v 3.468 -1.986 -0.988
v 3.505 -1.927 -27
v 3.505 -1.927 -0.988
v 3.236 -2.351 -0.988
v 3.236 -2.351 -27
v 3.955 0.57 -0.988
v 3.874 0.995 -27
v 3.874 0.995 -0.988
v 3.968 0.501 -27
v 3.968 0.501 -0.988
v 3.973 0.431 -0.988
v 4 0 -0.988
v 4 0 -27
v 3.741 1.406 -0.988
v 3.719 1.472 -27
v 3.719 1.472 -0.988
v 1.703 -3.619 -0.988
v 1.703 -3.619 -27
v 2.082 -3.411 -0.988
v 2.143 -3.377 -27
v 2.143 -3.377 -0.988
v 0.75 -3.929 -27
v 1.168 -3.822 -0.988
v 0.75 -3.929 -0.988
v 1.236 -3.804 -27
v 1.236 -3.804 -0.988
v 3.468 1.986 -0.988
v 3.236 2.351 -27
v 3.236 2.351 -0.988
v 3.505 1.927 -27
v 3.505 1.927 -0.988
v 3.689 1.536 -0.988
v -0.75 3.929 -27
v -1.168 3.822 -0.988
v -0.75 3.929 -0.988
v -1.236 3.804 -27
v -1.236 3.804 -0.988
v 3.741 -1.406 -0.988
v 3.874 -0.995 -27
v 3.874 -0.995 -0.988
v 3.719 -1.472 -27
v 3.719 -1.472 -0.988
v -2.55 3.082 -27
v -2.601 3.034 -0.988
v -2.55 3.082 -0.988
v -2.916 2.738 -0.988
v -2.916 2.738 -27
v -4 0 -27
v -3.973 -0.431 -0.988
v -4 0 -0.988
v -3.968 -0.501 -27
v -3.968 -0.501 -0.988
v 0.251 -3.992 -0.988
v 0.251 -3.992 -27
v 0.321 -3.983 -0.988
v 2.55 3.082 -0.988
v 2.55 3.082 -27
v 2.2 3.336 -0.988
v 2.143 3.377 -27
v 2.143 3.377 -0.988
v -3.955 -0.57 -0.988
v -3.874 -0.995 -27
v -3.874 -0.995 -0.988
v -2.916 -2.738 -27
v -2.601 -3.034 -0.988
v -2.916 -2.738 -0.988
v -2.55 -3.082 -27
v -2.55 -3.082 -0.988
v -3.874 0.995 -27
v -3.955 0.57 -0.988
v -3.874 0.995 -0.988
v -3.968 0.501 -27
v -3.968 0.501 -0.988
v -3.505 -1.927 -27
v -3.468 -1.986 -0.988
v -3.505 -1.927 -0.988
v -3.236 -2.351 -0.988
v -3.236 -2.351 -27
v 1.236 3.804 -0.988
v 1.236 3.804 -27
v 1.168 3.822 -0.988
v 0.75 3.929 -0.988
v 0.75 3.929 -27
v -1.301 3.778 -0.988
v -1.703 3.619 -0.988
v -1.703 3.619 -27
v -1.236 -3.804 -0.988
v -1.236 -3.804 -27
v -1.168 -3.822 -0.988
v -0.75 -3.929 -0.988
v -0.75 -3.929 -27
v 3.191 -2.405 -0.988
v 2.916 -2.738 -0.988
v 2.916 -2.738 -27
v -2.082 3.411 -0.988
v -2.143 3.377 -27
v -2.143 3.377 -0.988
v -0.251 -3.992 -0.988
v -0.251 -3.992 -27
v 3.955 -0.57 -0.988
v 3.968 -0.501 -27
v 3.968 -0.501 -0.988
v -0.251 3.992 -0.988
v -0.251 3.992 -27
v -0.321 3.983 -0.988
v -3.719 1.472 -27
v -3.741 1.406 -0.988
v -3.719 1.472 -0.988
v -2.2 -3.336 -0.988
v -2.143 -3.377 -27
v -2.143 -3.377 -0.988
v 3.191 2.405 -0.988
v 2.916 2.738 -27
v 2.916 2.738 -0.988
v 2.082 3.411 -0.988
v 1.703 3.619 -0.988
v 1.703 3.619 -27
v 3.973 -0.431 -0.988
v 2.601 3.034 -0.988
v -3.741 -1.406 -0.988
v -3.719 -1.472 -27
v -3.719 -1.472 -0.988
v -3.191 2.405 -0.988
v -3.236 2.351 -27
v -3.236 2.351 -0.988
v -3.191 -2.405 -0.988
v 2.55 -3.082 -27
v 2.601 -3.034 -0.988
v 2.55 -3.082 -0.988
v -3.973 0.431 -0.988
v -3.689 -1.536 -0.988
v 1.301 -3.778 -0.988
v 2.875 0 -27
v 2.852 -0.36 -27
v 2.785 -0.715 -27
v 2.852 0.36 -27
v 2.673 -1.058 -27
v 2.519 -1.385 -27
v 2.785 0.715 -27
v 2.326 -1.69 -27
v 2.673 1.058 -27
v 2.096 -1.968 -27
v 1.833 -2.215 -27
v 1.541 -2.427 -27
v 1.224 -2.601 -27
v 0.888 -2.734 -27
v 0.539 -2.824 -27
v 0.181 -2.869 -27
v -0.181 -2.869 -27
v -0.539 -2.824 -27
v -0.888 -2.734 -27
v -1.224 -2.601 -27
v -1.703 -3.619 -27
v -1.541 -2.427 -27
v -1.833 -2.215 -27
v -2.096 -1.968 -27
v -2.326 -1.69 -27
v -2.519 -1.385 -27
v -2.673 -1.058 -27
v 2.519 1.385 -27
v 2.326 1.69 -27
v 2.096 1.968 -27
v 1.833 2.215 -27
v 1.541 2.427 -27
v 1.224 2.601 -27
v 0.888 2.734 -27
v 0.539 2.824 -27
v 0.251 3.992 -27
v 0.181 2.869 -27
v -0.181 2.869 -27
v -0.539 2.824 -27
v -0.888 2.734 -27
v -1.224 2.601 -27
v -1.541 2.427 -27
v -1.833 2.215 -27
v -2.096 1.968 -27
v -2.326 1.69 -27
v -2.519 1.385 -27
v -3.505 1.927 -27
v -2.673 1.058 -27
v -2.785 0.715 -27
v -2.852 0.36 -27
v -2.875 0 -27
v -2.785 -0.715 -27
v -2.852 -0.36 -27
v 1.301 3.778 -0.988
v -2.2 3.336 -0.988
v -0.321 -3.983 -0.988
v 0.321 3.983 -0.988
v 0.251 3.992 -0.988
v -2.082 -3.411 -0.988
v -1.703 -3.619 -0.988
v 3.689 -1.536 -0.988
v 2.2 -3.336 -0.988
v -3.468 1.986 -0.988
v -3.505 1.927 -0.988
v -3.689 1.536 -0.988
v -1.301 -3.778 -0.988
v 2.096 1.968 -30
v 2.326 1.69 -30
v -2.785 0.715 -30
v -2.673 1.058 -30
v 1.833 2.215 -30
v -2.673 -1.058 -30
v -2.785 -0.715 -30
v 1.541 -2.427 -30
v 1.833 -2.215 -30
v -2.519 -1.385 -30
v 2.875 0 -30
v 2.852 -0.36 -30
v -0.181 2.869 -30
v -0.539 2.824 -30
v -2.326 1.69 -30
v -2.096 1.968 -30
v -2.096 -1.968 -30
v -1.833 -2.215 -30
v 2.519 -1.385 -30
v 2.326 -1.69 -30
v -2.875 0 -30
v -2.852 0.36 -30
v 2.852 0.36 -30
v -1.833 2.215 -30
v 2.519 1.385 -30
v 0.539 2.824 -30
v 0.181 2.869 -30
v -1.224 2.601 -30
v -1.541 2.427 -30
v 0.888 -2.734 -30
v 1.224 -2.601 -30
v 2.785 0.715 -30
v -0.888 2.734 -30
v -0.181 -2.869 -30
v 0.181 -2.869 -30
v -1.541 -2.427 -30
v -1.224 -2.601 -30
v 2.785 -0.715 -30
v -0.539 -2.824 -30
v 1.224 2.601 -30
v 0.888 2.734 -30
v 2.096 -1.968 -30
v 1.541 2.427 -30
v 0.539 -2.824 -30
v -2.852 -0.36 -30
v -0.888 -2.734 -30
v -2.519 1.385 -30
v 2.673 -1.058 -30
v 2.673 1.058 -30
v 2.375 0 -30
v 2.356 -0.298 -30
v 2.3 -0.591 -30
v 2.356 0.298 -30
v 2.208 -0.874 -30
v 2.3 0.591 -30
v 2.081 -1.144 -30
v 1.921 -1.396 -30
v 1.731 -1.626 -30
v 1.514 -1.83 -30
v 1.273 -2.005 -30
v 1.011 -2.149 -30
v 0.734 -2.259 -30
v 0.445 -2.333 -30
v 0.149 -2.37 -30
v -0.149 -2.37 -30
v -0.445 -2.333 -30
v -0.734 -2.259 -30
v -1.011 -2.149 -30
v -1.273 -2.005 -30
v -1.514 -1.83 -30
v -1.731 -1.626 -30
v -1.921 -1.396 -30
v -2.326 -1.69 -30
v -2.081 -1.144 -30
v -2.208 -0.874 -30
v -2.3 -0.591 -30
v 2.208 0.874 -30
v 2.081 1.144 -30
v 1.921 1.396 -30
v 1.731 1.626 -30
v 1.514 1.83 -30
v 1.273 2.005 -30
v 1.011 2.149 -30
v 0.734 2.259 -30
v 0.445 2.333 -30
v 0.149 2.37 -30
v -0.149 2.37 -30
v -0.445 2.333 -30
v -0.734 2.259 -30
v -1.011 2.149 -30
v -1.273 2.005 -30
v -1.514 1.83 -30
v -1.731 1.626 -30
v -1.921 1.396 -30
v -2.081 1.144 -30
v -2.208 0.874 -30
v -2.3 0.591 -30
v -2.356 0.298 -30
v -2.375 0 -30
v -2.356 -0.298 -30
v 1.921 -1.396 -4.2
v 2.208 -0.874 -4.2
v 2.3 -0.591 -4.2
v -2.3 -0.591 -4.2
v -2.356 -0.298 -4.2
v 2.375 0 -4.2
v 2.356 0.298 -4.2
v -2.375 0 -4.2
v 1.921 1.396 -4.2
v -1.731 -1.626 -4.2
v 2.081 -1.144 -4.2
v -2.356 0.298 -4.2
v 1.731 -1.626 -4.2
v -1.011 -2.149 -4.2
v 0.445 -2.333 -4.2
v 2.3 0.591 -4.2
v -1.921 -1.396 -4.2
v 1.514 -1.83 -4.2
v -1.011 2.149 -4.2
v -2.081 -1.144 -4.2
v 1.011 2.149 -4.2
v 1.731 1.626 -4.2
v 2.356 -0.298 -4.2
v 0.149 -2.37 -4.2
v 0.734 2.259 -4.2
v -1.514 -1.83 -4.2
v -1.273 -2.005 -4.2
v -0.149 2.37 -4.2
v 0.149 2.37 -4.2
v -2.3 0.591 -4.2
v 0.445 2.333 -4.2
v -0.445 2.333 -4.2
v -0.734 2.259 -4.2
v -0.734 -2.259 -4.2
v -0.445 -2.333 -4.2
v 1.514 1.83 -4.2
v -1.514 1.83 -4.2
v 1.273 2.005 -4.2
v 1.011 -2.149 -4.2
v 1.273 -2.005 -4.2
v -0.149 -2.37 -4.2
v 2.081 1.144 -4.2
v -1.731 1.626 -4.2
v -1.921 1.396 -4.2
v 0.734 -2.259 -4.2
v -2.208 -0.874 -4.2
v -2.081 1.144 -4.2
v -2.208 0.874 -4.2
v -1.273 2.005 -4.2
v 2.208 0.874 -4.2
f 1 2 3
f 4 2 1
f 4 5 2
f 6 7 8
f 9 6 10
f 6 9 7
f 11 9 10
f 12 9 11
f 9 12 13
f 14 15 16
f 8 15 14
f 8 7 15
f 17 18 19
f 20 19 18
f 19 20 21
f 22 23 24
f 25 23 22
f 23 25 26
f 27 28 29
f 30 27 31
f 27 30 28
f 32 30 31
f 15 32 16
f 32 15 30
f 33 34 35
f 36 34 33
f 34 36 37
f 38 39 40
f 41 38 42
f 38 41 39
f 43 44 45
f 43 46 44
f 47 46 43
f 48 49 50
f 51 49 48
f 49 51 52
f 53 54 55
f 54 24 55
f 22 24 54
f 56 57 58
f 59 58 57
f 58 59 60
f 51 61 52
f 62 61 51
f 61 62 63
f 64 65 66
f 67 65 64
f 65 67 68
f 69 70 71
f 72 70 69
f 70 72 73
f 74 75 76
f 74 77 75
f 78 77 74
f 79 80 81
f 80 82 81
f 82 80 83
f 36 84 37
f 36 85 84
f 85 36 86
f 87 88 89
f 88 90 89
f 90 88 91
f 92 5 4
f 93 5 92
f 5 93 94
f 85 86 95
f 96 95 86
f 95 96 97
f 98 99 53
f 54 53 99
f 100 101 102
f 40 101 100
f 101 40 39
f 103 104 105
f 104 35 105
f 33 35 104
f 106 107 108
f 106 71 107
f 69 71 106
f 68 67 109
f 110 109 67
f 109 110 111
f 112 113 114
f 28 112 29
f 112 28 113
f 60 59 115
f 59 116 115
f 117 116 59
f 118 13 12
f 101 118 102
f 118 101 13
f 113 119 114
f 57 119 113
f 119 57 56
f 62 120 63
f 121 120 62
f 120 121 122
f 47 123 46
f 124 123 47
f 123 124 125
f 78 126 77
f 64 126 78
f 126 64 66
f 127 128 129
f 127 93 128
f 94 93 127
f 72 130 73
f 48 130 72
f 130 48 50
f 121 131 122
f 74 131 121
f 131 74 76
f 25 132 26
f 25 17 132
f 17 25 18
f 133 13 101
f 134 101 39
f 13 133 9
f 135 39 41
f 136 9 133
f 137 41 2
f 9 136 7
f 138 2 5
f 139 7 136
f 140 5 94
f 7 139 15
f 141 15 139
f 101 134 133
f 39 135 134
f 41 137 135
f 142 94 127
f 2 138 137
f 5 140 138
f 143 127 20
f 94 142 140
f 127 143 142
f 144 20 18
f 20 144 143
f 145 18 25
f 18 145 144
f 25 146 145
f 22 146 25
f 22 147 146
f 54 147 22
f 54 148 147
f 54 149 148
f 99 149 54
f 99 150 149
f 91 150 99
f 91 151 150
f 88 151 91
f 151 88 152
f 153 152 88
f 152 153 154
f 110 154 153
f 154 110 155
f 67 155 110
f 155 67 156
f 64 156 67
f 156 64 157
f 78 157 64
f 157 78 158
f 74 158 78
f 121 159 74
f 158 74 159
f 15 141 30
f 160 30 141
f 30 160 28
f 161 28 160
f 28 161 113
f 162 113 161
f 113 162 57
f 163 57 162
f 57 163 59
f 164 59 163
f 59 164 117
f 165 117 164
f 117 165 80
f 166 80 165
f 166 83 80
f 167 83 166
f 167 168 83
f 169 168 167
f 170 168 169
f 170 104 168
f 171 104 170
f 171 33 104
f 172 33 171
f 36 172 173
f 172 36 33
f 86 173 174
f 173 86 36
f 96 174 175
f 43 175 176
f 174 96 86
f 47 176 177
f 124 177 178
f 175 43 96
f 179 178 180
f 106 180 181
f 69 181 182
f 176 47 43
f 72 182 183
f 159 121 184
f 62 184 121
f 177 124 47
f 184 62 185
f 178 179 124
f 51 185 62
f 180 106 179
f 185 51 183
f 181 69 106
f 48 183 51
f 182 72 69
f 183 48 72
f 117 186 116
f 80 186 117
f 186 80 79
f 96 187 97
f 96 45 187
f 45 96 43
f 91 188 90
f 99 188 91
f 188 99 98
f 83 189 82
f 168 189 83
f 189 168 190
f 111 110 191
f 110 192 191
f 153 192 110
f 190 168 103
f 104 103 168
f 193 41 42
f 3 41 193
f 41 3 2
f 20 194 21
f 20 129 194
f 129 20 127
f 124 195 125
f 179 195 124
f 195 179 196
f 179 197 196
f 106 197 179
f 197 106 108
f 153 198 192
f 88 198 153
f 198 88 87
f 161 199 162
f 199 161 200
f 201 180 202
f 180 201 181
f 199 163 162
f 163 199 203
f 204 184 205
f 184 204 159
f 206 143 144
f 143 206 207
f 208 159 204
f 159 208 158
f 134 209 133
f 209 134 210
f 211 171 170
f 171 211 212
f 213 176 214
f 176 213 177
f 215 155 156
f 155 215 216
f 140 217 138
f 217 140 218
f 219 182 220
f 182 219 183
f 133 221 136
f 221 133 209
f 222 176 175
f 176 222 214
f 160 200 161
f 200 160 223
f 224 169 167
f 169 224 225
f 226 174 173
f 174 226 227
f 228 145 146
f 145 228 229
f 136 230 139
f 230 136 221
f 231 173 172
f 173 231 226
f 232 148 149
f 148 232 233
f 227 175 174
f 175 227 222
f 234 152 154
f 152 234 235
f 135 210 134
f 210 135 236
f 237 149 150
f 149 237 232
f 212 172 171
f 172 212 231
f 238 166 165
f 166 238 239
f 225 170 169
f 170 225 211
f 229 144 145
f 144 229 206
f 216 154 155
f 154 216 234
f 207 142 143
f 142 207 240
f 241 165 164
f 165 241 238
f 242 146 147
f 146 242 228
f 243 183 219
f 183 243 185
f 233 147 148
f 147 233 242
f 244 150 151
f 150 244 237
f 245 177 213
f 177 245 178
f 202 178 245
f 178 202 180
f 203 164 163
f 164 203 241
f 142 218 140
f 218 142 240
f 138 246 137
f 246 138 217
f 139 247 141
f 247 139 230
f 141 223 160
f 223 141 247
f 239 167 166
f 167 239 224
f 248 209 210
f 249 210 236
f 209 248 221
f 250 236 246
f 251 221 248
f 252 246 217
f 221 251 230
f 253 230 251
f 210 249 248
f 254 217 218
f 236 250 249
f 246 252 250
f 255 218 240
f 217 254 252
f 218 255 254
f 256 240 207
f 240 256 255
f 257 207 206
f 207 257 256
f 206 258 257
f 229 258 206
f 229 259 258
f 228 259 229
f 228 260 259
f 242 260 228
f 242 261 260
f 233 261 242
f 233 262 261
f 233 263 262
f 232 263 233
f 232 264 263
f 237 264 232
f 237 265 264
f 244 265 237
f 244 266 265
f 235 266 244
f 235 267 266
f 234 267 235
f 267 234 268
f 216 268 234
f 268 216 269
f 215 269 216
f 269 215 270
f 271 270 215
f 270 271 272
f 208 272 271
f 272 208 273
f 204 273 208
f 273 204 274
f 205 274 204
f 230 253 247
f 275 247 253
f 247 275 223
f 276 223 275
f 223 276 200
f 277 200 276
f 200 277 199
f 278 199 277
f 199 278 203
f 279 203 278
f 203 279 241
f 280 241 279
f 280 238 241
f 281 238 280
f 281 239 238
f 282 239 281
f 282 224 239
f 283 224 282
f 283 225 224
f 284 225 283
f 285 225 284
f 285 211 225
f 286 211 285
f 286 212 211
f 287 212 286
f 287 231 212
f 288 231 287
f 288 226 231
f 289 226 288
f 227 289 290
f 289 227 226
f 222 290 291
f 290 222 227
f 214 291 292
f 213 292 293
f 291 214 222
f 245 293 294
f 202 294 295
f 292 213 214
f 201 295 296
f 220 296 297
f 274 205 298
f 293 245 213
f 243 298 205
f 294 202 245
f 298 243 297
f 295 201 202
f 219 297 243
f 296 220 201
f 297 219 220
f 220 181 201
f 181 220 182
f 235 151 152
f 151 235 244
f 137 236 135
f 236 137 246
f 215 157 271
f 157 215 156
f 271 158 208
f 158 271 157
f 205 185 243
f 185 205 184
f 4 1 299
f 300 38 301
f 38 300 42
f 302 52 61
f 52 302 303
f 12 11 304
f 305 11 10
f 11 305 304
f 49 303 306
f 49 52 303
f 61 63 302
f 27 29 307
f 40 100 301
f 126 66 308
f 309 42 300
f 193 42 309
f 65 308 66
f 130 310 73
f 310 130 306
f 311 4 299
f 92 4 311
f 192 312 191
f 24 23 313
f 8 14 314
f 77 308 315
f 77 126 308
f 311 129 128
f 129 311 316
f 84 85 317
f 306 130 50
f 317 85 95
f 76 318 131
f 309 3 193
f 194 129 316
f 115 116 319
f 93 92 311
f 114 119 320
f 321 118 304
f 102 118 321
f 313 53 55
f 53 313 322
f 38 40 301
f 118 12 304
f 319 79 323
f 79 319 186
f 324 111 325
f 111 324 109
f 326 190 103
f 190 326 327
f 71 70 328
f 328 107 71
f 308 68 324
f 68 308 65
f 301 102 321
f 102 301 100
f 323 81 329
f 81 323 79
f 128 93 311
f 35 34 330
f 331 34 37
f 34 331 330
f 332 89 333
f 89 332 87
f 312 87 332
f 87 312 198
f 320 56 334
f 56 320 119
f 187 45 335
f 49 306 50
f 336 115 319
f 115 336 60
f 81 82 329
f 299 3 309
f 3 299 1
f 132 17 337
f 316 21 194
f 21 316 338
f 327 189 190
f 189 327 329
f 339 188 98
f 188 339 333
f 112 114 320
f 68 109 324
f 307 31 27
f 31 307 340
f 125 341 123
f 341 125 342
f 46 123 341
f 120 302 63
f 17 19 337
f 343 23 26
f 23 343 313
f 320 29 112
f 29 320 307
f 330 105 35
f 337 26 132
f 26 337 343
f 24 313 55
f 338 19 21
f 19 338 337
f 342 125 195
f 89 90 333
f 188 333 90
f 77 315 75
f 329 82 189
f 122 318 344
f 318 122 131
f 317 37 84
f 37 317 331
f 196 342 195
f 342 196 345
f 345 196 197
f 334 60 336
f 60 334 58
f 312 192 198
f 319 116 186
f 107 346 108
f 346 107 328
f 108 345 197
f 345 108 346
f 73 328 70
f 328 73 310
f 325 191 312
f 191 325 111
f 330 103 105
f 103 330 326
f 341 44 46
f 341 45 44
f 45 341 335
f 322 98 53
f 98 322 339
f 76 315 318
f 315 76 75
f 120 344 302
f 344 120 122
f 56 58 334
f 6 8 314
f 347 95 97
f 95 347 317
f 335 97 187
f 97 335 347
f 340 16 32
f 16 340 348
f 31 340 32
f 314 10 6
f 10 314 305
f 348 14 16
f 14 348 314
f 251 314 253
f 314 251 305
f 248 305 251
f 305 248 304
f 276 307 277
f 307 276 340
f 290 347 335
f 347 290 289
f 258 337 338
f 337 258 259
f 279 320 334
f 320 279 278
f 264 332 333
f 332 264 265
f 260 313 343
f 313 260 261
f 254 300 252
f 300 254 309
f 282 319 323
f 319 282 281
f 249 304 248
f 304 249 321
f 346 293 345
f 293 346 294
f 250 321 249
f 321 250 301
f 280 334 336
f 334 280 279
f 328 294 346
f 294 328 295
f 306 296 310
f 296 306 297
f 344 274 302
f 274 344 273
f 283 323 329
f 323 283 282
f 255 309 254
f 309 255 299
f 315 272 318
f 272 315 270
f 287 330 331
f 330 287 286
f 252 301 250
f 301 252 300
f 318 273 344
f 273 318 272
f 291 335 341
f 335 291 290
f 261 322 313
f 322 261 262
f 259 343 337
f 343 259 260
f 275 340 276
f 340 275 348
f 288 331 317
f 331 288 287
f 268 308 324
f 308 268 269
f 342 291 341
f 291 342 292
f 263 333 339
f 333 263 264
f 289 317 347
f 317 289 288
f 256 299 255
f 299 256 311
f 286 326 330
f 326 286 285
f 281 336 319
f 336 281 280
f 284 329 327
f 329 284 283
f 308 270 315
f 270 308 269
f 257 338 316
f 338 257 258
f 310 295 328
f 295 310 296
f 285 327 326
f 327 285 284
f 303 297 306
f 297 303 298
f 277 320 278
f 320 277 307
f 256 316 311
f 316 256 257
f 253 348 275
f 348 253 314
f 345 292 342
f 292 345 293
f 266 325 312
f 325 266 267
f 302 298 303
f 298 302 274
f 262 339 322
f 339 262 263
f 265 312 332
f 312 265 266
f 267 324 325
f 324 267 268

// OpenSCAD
$fn = 50;

difference() {
	union() {
		translate(v = [0, 0, -27.0]) {
			cylinder(h = 27, r = 4.0);
		}
		#translate(v = [0, 0, -30.0]) {
			cylinder(h = 30, r = 2.875);
		}
	}
	union() {
		translate(v = [0, 0, 0]) {
			rotate(a = [0, 0, 0]) {
				difference() {
					union() {
						translate(v = [0, 0, -30.0]) {
							cylinder(h = 30, r = 2.25);
						}
						translate(v = [0, 0, -4.2]) {
							cylinder(h = 4.2, r1 = 2.375, r2 = 4.5);
						}
						translate(v = [0, 0, -30.0]) {
							cylinder(h = 30, r = 2.375);
						}
						translate(v = [0, 0, -30.0]) {
							cylinder(h = 30, r = 2.25);
						}
					}
					union();
				}
			}
		}
	}
}
